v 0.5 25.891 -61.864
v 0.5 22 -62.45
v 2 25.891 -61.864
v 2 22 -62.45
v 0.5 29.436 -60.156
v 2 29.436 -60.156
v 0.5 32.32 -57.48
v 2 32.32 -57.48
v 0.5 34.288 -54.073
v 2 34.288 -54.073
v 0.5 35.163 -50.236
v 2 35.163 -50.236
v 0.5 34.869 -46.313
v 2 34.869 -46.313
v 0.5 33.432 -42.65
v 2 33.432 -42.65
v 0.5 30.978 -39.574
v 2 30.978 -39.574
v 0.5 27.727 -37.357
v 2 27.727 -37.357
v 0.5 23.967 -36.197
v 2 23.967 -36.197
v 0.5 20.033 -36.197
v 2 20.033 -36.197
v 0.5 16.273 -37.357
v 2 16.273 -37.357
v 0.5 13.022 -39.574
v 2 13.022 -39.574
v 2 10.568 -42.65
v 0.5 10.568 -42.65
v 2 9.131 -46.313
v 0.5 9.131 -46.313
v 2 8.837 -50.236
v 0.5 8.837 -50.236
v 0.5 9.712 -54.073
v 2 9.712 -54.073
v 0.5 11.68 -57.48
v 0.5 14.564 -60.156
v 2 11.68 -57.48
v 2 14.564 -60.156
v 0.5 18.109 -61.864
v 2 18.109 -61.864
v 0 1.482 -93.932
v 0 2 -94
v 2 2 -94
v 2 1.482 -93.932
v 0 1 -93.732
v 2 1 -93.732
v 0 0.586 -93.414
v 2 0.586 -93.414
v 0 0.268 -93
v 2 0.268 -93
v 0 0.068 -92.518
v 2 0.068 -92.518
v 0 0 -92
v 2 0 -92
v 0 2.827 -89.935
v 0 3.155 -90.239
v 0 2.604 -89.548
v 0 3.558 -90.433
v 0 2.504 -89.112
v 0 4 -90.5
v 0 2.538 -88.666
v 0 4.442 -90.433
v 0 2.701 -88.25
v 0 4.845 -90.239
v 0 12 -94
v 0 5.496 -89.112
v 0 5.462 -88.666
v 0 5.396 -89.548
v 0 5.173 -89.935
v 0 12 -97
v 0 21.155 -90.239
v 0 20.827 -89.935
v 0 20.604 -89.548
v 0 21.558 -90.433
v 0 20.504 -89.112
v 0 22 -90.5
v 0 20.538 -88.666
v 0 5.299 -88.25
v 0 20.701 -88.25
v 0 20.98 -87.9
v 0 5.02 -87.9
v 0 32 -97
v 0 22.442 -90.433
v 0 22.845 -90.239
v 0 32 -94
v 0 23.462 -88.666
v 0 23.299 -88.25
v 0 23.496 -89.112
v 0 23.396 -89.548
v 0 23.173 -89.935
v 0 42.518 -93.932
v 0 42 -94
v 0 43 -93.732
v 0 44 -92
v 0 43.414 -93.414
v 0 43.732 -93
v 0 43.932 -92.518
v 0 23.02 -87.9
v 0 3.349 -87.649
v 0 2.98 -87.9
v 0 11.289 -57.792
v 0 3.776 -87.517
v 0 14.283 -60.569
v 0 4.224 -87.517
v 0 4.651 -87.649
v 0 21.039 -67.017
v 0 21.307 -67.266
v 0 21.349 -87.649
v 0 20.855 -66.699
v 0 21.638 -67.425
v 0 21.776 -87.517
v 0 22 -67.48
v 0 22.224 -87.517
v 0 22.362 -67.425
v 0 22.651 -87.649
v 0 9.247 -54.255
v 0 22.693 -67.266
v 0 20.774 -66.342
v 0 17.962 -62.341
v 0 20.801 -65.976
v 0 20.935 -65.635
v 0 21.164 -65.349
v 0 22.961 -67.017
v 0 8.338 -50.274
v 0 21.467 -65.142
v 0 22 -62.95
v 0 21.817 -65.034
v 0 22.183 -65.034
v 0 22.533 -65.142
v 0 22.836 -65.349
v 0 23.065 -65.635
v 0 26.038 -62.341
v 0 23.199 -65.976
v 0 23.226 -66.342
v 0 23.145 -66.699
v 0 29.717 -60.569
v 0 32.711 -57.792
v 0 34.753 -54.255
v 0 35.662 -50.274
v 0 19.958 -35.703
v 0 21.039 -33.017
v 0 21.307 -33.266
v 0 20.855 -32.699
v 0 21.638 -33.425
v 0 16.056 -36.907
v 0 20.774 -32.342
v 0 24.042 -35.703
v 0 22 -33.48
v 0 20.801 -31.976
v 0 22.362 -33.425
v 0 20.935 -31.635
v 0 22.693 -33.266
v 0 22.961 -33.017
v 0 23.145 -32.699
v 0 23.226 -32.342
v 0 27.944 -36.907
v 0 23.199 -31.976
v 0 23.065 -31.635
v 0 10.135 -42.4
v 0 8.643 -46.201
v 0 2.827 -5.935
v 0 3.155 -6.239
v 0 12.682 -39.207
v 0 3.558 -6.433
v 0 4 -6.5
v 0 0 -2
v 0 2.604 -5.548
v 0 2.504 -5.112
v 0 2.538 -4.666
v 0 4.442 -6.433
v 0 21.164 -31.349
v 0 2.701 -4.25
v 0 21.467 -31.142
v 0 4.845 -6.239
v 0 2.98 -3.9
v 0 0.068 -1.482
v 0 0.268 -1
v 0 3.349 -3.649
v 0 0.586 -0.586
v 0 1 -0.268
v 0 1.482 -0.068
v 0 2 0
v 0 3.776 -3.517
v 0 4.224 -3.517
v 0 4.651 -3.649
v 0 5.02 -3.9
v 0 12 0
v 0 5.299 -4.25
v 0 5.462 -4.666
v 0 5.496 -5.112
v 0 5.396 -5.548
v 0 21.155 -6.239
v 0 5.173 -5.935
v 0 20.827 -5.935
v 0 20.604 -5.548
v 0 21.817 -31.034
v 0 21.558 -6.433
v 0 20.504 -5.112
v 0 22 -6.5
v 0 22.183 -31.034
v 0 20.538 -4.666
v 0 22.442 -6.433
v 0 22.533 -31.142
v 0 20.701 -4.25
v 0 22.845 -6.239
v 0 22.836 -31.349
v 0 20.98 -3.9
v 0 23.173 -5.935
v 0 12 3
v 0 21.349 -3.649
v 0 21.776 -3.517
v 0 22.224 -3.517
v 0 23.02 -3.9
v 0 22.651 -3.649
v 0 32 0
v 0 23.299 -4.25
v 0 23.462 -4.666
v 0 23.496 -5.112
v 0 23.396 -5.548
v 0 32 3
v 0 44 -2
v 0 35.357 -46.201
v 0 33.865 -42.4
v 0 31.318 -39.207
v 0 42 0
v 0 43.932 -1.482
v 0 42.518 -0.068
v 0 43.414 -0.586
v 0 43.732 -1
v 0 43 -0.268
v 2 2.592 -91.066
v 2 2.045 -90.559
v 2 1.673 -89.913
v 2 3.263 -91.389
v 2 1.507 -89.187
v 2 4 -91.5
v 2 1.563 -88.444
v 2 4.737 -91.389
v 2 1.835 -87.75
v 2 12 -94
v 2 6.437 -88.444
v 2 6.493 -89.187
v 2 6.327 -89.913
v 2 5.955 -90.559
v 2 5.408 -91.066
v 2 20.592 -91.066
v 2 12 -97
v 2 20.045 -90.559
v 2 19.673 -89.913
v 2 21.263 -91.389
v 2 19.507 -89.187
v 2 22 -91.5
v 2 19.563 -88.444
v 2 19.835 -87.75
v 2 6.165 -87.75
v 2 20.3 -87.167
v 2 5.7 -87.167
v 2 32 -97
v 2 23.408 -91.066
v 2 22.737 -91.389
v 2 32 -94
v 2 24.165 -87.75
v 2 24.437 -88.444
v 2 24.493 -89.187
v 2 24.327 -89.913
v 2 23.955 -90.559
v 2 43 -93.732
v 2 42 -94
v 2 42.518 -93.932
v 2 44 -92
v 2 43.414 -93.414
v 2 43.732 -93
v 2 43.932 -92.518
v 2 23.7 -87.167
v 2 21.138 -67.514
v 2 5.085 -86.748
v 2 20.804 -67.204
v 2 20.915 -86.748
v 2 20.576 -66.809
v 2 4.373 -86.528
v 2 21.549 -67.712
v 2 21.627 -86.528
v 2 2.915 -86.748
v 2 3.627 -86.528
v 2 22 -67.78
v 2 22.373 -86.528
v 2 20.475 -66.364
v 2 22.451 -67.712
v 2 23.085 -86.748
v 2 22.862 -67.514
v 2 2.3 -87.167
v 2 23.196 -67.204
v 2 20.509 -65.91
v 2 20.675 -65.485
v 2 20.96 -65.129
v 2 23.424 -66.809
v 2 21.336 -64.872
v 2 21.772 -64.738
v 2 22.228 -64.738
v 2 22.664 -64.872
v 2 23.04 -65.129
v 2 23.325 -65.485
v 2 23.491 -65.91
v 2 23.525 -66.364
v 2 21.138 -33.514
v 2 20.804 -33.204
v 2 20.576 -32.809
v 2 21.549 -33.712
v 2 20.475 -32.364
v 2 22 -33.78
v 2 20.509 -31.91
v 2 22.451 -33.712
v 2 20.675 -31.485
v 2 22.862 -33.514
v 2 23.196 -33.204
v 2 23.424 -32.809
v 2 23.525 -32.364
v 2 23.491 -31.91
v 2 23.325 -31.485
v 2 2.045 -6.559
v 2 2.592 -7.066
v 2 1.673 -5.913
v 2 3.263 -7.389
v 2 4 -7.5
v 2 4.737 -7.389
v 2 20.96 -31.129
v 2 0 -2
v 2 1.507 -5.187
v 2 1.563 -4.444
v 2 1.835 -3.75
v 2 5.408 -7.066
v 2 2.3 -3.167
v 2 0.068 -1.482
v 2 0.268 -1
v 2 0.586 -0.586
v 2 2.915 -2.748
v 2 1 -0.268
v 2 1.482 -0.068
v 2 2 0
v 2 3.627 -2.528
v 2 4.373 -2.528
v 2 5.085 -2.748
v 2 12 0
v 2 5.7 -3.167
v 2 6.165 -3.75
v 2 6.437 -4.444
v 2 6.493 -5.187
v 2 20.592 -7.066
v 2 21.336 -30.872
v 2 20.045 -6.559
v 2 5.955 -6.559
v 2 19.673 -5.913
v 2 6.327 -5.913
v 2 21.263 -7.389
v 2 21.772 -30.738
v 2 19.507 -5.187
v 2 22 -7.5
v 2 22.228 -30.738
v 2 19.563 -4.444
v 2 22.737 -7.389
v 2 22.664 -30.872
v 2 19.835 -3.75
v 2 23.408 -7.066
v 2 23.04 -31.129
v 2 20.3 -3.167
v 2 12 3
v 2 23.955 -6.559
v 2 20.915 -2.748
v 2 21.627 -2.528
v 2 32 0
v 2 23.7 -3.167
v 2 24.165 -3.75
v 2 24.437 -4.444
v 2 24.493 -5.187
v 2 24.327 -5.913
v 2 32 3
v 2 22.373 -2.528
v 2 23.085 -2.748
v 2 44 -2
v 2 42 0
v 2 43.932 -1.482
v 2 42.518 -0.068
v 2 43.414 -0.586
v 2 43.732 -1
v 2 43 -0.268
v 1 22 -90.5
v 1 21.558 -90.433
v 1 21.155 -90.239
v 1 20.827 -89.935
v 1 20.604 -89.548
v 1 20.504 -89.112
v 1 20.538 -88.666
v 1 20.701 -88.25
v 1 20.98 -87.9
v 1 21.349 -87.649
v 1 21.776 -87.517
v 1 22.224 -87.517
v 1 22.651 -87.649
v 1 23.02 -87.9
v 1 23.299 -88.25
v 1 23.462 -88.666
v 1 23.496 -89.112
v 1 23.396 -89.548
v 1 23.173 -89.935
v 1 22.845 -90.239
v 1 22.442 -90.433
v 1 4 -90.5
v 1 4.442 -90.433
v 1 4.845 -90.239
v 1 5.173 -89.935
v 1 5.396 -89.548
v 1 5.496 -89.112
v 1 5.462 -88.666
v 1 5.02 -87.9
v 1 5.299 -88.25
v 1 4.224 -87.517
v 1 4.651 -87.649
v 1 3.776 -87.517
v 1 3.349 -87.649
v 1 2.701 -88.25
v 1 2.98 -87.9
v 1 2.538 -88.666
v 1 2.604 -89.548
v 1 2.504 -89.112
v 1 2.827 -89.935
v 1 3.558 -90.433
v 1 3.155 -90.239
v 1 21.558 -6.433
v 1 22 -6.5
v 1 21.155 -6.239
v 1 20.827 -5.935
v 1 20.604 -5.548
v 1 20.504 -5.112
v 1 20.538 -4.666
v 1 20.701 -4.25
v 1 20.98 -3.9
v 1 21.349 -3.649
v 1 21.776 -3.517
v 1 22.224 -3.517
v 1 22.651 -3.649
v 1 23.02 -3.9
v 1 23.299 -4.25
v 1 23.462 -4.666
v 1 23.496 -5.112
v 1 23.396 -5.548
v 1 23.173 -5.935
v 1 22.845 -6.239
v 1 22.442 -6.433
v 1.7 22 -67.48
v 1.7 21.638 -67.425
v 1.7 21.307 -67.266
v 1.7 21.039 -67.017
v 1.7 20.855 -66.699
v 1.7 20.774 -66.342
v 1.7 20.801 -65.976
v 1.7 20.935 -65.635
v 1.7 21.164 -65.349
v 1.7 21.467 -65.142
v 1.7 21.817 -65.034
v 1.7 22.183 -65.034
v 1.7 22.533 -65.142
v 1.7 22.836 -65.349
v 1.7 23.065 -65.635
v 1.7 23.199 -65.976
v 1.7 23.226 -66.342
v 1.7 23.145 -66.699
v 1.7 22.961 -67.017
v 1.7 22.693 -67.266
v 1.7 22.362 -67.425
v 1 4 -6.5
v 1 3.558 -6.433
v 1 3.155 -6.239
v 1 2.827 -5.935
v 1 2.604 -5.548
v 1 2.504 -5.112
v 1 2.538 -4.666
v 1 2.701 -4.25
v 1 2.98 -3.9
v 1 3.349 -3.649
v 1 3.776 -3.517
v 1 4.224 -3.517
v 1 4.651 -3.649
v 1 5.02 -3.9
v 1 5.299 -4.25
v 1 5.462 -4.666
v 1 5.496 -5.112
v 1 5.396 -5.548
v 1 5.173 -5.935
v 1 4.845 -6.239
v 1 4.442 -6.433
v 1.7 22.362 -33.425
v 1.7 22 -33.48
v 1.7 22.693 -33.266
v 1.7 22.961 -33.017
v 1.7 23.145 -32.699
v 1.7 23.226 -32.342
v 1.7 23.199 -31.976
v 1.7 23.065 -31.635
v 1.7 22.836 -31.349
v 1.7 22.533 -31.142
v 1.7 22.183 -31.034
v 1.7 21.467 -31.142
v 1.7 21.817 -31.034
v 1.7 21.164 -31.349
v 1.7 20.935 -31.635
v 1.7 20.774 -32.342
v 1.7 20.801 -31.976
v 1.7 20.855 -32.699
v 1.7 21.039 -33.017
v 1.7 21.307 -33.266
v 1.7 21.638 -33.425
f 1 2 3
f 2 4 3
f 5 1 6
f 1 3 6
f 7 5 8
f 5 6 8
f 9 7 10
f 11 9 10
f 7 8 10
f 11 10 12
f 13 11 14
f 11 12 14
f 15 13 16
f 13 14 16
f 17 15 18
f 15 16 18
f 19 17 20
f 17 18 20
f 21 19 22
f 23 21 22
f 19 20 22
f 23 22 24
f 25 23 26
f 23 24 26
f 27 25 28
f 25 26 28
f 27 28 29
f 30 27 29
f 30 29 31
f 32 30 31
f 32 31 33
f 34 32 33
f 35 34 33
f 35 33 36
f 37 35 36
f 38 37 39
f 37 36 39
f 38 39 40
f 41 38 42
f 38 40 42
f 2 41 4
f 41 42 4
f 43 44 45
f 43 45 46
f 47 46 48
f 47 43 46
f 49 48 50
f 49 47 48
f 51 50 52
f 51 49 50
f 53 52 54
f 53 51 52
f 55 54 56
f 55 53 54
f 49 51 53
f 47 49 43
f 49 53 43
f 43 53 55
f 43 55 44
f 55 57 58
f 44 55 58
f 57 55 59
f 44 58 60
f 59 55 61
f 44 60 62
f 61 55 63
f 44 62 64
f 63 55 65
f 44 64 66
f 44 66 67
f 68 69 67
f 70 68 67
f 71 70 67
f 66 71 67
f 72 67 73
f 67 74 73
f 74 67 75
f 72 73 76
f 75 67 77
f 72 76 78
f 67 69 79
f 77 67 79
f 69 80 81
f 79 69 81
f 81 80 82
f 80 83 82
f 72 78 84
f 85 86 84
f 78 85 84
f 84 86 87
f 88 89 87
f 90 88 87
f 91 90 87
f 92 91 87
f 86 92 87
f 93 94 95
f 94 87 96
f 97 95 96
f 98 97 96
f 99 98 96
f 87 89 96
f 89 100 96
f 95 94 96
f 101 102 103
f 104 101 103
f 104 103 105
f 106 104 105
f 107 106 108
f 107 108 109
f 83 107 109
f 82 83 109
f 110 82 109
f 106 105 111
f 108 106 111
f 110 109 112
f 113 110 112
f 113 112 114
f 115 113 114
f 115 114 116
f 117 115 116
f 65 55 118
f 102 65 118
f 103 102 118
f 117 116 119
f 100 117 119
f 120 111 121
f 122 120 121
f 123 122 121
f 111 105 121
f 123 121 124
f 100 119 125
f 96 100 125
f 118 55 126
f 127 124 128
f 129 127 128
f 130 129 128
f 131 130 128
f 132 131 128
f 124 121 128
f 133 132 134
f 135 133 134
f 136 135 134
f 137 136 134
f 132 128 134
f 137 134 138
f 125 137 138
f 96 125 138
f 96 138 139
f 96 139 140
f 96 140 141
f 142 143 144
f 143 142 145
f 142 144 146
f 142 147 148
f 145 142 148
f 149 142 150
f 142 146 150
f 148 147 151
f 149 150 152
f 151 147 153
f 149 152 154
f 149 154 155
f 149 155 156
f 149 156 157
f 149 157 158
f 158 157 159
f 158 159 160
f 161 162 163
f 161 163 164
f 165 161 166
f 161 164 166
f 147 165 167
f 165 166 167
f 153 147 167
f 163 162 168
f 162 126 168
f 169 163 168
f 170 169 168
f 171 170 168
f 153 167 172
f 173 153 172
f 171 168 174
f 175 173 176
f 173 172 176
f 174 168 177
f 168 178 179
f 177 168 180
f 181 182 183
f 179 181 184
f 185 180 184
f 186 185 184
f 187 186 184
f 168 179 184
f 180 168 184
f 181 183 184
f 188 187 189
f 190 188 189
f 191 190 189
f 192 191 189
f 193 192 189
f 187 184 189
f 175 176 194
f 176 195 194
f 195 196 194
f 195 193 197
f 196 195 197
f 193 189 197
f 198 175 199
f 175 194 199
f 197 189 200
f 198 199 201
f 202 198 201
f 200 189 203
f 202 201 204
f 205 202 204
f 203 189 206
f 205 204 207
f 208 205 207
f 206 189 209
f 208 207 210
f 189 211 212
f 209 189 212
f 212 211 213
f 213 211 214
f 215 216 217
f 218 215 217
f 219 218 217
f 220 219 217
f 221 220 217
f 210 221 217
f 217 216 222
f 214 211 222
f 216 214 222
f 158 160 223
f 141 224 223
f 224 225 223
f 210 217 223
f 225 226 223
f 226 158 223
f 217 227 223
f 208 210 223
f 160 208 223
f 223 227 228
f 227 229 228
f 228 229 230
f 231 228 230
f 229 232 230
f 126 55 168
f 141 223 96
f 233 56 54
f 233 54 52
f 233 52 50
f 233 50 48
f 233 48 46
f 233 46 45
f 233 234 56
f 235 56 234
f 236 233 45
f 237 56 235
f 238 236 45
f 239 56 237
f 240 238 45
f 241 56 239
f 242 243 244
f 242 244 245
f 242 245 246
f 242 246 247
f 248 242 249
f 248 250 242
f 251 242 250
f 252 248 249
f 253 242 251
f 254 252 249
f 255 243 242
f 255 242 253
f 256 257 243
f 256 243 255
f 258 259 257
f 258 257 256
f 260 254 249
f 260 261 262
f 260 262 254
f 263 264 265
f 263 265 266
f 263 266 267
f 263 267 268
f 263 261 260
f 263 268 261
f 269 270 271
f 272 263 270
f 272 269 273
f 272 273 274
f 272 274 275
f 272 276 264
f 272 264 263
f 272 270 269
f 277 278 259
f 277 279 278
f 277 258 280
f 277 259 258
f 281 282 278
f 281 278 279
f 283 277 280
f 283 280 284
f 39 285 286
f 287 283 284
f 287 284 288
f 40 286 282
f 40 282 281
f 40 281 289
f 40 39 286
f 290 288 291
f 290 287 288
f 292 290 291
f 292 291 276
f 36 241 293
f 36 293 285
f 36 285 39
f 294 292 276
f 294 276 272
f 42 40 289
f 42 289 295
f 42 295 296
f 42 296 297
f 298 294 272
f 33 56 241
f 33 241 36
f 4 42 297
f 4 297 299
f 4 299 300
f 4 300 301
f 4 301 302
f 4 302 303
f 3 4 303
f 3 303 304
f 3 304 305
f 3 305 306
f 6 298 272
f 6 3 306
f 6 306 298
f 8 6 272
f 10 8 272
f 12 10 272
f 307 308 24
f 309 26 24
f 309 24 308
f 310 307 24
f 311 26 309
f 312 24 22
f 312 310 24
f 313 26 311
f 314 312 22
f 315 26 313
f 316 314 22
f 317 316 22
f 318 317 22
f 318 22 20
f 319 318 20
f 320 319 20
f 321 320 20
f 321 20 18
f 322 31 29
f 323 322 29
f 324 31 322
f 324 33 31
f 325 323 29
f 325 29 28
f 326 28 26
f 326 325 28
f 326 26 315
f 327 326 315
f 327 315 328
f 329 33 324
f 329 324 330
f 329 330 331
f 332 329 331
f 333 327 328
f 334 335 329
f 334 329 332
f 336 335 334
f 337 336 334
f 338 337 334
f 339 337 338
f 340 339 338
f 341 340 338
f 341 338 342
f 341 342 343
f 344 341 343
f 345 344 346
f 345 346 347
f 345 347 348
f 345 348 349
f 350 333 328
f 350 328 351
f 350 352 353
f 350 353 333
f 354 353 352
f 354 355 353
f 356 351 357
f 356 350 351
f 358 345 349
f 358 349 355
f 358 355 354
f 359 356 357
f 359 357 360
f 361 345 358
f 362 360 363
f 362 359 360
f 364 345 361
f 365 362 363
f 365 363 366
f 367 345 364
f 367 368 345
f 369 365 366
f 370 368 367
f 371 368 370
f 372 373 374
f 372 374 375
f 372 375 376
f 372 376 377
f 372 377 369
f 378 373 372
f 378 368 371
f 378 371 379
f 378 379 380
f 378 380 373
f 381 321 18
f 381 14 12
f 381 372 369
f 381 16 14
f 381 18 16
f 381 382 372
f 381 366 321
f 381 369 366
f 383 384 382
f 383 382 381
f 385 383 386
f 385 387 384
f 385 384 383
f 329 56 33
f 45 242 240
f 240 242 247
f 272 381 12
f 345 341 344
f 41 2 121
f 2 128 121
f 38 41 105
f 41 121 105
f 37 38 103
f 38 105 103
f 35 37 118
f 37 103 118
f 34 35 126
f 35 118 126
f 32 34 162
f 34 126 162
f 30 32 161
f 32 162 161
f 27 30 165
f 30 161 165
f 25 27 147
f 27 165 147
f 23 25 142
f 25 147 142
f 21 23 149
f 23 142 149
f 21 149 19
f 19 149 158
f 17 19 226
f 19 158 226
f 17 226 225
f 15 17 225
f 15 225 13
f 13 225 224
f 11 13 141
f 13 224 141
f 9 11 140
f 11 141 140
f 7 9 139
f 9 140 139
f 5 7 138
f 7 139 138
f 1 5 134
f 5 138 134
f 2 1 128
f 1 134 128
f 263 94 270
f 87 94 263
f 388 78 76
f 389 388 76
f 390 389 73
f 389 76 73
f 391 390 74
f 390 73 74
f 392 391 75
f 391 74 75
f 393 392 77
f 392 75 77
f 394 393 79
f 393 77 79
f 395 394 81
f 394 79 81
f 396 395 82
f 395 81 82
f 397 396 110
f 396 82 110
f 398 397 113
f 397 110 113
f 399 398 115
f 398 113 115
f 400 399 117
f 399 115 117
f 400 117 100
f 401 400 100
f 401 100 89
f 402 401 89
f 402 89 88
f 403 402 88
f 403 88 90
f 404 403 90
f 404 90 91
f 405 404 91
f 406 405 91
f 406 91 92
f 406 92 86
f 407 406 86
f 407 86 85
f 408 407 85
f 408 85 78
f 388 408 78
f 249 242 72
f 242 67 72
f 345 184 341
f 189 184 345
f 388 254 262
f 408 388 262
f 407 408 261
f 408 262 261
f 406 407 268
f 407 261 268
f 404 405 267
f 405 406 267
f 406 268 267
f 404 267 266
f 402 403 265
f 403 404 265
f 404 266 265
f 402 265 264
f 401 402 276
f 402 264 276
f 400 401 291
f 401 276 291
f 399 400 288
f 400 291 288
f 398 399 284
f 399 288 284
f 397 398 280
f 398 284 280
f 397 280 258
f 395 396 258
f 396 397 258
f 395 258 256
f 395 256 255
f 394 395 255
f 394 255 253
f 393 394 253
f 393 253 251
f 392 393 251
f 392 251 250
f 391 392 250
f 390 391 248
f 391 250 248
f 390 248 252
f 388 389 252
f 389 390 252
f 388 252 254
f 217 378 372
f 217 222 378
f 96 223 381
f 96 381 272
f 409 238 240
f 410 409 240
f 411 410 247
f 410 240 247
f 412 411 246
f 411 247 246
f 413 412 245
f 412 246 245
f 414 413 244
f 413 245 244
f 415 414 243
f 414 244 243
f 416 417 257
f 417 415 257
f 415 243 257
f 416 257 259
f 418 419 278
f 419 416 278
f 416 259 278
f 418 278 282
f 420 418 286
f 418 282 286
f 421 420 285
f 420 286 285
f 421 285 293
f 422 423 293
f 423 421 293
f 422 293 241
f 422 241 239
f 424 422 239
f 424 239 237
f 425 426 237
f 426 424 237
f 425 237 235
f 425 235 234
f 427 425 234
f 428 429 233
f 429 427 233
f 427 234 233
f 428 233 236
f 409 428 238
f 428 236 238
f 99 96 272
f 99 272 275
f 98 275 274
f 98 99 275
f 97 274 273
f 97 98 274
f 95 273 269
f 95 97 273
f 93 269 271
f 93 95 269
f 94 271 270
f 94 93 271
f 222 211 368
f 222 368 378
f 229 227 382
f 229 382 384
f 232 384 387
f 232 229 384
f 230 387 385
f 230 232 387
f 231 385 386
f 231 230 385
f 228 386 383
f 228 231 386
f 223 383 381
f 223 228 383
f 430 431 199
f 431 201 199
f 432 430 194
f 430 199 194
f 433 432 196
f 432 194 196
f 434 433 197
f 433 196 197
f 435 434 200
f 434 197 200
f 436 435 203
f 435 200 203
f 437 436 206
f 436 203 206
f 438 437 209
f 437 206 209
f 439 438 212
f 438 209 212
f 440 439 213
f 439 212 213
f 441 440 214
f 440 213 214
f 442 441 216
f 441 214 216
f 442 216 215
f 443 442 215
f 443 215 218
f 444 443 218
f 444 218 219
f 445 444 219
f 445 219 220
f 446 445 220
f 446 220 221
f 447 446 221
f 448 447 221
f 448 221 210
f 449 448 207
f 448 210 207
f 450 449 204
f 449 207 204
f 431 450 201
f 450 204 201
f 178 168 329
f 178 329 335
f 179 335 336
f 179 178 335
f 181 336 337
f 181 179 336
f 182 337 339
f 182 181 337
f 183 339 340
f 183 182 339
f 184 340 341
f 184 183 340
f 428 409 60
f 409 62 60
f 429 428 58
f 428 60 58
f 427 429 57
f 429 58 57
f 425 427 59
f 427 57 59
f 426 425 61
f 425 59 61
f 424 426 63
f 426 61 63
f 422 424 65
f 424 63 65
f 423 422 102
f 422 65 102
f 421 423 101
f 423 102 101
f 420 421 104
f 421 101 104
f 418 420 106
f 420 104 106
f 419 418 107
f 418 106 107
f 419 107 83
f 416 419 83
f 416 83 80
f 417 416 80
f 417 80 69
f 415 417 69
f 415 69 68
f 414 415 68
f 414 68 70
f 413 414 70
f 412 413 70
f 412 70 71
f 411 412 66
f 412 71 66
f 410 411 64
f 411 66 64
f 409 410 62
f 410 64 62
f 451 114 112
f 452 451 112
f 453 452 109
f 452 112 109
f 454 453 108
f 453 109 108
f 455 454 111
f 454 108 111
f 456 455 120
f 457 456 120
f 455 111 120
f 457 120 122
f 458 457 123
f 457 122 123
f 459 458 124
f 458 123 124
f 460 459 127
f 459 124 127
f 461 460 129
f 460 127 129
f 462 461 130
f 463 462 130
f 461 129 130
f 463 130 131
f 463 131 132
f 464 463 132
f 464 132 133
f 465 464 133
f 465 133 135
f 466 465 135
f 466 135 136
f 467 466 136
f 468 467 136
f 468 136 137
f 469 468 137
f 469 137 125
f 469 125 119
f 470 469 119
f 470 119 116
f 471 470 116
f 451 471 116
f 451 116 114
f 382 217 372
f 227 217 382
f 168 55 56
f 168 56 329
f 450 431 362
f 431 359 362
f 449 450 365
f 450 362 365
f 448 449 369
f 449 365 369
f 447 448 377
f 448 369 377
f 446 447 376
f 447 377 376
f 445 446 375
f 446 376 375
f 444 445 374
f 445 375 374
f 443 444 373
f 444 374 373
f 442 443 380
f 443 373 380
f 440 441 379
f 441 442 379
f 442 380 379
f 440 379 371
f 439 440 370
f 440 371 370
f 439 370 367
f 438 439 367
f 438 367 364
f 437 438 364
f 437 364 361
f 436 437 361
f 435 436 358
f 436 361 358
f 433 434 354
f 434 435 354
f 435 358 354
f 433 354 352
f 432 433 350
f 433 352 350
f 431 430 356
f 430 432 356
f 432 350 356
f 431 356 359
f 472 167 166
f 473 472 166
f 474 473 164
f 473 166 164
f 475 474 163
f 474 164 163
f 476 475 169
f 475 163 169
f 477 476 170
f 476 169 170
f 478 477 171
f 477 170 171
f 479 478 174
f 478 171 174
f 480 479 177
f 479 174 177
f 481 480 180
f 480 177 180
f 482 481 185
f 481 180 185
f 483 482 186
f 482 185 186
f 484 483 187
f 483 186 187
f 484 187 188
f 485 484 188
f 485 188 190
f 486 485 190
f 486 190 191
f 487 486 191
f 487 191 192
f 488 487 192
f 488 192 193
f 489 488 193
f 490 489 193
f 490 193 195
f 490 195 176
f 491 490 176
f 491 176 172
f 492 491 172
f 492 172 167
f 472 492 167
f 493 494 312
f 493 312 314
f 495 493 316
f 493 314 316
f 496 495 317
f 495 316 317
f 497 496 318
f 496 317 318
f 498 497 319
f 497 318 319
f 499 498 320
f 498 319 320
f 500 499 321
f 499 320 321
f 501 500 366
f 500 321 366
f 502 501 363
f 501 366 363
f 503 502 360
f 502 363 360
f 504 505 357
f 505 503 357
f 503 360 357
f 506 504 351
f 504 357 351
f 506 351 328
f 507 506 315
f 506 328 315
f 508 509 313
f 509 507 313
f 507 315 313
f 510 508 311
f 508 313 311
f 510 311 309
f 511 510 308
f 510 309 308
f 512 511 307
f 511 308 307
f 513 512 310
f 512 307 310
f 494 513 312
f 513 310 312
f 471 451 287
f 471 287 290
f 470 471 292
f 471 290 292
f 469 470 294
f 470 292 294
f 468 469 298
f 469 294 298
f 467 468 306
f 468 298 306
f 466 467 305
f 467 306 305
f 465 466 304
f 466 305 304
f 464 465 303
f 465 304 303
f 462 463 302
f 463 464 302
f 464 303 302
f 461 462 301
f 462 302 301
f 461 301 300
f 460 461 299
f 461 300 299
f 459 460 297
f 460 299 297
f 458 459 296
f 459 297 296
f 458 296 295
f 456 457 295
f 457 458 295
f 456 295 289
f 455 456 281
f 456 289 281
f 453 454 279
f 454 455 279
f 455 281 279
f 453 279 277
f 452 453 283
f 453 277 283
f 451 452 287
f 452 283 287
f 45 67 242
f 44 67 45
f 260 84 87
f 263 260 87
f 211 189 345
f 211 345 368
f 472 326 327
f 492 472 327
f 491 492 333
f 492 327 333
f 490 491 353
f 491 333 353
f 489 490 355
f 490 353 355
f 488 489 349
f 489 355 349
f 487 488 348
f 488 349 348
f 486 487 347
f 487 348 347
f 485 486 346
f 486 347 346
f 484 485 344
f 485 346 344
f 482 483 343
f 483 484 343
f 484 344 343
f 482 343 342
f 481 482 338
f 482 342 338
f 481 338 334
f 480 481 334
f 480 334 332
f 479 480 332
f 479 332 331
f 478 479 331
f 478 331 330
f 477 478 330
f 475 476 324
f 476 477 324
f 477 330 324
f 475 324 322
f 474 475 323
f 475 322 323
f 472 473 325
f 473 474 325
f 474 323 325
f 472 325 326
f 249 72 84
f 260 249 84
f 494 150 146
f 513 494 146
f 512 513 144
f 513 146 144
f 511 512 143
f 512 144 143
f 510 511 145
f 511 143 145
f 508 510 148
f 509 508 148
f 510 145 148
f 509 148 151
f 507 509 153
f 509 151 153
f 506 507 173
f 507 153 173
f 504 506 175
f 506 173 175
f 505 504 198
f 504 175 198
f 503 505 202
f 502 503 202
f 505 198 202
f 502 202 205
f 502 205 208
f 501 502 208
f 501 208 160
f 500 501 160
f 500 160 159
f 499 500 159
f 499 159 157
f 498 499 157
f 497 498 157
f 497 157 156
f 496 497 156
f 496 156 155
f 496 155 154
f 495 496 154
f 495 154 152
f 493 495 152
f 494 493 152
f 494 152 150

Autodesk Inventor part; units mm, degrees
ref_plane "YZ Plane" through (0, 0, 0) normal (1, 0, 0) x (0, 1, 0)
ref_plane "XZ Plane" through (0, 0, 0) normal (0, 1, 0) x (-1, 0, 0)
ref_plane "XY Plane" through (0, 0, 0) normal (0, 0, 1) x (1, 0, 0)
sketch "Sketch1" plane through (0, 0, 0) normal (1, 0, 0) x (0, 1, 0)
  line L0 (2, 0) -> (42, 0)
  line L1 (44, -2) -> (44, -92)
  line L2 (42, -94) -> (2, -94)
  line L3 (0, -92) -> (0, -2)
  line L4 (32, -94) -> (12, -94)
  line L5 (12, -94) -> (12, -97)
  line L6 (12, -97) -> (32, -97)
  line L7 (32, -97) -> (32, -94)
  line L8 (44.4582, -47) -> (27.4431, -47) construction
  line L9 (32, 0) -> (12, 0)
  line L10 (12, 0) -> (12, 3)
  line L11 (12, 3) -> (32, 3)
  line L12 (32, 3) -> (32, 0)
  arc A0 (42, -94) -> (44, -92) centre (42, -92) ccw
  arc A1 (0, -92) -> (2, -94) centre (2, -92) ccw
  arc A2 (2, 0) -> (0, -2) centre (2, -2) ccw
  arc A3 (44, -2) -> (42, 0) centre (42, -2) ccw
  point P0 (0, 0)
  point P1 (44, -94)
  point P2 (44, 0)
  point P3 (0, -94)
  point P4 (12, -95.5)
  point P5 (12, 1.5)
  dimension "d0" = 94
  dimension "d1" = 44
  dimension "d28" = 20
  dimension "d29" = 3
  dimension "d30" = 12
  dimension "d31" = 2
extrude "Extrusion1" add sketch "Sketch1" along normal blind 2
sketch "Sketch3" plane through (2, 0, 0) normal (1, 0, 0) x (0, 0, -1)
  circle A0 centre (49.25, 22) radius 13.2
  line L0 (0, 0) -> (92, 0) projected
  line L1 (94, 2) -> (94, 42) projected
  point P0 (120, 0)
  point P1 (120, 62)
  point P2 (94, 2)
  dimension "d23" = 26.4
  dimension "d24" = 22
  dimension "d25" = 44.75
extrude "Extrusion2" cut sketch "Sketch3" against normal through all
sketch "Sketch4" plane through (2, 0, 0) normal (1, 0, 0) x (0, 0, -1)
  circle A0 centre (5, 22) radius 1.5
  circle A1 centre (89, 22) radius 1.5
  line L0 (2, 0) -> (92, 0) projected
  line L1 (92, 44) -> (2, 44) projected
  line L2 (0, 42) -> (0, 32) projected
  line L3 (94, 32) -> (94, 42) projected
  circle A2 centre (89, 4) radius 1.5
  circle A3 centre (5, 4) radius 1.5
  point P0 (0, 0)
  dimension "d32" = 3
  dimension "d33" = 3
  dimension "d34" = 44
  dimension "d35" = 22
  dimension "d36" = 5
  dimension "d37" = 5
  dimension "d62" = 3
  dimension "d63" = 3
  dimension "d64" = 18
hole "Hole2" at (2, 22, -5) at (2, 22, -89) at (2, 4, -89) at (2, 4, -5) direction (-1, 0, 0) diameter 3 depth 14.2 tip angle 118
chamfer "Chamfer2" distance 1 angle 45 4 edges at (2, 4, -87.5) (2, 22, -87.5) (2, 4, -3.5) (2, 22, -3.5)
sketch "Sketch5" plane through (2, 0, 0) normal (1, 0, 0) x (0, 0, -1)
  circle A0 centre (66.25, 22) radius 1.5
  circle A1 centre (32.25, 22) radius 1.5
  circle A2 centre (89, 22) radius 1.5 projected
  line L0 (89, 22) -> (83.0572, 22)
  circle A3 centre (49.25, 22) radius 13.2 projected
  point P0 (0, 0)
  point P1 (49.25, 8.8)
  dimension "d48" = 3
  dimension "d49" = 3
  dimension "d50" = 34
  dimension "d51" = 17
hole "Hole3" at (2, 22, -66.25) at (2, 22, -32.25) direction (-1, 0, 0) diameter 2.459 depth 8.8 tip angle 118 thread size "M3x0.5" class "6H" standard "ISO Metric profile"
chamfer "Chamfer3" distance 0.3 angle 45 2 edges at (2, 22, -65.0205) (2, 22, -31.0205)
chamfer "Chamfer4" distance 0.5 angle 45 1 edges at (0, 22, -36.05)
equation "\"d30\" = -0.5 * d28 + 0.5 * d1"
equation "\"d35\" = 0.5 * d34"
equation "\"d51\" = 0.5 * d50"
properties part number "ściana"
